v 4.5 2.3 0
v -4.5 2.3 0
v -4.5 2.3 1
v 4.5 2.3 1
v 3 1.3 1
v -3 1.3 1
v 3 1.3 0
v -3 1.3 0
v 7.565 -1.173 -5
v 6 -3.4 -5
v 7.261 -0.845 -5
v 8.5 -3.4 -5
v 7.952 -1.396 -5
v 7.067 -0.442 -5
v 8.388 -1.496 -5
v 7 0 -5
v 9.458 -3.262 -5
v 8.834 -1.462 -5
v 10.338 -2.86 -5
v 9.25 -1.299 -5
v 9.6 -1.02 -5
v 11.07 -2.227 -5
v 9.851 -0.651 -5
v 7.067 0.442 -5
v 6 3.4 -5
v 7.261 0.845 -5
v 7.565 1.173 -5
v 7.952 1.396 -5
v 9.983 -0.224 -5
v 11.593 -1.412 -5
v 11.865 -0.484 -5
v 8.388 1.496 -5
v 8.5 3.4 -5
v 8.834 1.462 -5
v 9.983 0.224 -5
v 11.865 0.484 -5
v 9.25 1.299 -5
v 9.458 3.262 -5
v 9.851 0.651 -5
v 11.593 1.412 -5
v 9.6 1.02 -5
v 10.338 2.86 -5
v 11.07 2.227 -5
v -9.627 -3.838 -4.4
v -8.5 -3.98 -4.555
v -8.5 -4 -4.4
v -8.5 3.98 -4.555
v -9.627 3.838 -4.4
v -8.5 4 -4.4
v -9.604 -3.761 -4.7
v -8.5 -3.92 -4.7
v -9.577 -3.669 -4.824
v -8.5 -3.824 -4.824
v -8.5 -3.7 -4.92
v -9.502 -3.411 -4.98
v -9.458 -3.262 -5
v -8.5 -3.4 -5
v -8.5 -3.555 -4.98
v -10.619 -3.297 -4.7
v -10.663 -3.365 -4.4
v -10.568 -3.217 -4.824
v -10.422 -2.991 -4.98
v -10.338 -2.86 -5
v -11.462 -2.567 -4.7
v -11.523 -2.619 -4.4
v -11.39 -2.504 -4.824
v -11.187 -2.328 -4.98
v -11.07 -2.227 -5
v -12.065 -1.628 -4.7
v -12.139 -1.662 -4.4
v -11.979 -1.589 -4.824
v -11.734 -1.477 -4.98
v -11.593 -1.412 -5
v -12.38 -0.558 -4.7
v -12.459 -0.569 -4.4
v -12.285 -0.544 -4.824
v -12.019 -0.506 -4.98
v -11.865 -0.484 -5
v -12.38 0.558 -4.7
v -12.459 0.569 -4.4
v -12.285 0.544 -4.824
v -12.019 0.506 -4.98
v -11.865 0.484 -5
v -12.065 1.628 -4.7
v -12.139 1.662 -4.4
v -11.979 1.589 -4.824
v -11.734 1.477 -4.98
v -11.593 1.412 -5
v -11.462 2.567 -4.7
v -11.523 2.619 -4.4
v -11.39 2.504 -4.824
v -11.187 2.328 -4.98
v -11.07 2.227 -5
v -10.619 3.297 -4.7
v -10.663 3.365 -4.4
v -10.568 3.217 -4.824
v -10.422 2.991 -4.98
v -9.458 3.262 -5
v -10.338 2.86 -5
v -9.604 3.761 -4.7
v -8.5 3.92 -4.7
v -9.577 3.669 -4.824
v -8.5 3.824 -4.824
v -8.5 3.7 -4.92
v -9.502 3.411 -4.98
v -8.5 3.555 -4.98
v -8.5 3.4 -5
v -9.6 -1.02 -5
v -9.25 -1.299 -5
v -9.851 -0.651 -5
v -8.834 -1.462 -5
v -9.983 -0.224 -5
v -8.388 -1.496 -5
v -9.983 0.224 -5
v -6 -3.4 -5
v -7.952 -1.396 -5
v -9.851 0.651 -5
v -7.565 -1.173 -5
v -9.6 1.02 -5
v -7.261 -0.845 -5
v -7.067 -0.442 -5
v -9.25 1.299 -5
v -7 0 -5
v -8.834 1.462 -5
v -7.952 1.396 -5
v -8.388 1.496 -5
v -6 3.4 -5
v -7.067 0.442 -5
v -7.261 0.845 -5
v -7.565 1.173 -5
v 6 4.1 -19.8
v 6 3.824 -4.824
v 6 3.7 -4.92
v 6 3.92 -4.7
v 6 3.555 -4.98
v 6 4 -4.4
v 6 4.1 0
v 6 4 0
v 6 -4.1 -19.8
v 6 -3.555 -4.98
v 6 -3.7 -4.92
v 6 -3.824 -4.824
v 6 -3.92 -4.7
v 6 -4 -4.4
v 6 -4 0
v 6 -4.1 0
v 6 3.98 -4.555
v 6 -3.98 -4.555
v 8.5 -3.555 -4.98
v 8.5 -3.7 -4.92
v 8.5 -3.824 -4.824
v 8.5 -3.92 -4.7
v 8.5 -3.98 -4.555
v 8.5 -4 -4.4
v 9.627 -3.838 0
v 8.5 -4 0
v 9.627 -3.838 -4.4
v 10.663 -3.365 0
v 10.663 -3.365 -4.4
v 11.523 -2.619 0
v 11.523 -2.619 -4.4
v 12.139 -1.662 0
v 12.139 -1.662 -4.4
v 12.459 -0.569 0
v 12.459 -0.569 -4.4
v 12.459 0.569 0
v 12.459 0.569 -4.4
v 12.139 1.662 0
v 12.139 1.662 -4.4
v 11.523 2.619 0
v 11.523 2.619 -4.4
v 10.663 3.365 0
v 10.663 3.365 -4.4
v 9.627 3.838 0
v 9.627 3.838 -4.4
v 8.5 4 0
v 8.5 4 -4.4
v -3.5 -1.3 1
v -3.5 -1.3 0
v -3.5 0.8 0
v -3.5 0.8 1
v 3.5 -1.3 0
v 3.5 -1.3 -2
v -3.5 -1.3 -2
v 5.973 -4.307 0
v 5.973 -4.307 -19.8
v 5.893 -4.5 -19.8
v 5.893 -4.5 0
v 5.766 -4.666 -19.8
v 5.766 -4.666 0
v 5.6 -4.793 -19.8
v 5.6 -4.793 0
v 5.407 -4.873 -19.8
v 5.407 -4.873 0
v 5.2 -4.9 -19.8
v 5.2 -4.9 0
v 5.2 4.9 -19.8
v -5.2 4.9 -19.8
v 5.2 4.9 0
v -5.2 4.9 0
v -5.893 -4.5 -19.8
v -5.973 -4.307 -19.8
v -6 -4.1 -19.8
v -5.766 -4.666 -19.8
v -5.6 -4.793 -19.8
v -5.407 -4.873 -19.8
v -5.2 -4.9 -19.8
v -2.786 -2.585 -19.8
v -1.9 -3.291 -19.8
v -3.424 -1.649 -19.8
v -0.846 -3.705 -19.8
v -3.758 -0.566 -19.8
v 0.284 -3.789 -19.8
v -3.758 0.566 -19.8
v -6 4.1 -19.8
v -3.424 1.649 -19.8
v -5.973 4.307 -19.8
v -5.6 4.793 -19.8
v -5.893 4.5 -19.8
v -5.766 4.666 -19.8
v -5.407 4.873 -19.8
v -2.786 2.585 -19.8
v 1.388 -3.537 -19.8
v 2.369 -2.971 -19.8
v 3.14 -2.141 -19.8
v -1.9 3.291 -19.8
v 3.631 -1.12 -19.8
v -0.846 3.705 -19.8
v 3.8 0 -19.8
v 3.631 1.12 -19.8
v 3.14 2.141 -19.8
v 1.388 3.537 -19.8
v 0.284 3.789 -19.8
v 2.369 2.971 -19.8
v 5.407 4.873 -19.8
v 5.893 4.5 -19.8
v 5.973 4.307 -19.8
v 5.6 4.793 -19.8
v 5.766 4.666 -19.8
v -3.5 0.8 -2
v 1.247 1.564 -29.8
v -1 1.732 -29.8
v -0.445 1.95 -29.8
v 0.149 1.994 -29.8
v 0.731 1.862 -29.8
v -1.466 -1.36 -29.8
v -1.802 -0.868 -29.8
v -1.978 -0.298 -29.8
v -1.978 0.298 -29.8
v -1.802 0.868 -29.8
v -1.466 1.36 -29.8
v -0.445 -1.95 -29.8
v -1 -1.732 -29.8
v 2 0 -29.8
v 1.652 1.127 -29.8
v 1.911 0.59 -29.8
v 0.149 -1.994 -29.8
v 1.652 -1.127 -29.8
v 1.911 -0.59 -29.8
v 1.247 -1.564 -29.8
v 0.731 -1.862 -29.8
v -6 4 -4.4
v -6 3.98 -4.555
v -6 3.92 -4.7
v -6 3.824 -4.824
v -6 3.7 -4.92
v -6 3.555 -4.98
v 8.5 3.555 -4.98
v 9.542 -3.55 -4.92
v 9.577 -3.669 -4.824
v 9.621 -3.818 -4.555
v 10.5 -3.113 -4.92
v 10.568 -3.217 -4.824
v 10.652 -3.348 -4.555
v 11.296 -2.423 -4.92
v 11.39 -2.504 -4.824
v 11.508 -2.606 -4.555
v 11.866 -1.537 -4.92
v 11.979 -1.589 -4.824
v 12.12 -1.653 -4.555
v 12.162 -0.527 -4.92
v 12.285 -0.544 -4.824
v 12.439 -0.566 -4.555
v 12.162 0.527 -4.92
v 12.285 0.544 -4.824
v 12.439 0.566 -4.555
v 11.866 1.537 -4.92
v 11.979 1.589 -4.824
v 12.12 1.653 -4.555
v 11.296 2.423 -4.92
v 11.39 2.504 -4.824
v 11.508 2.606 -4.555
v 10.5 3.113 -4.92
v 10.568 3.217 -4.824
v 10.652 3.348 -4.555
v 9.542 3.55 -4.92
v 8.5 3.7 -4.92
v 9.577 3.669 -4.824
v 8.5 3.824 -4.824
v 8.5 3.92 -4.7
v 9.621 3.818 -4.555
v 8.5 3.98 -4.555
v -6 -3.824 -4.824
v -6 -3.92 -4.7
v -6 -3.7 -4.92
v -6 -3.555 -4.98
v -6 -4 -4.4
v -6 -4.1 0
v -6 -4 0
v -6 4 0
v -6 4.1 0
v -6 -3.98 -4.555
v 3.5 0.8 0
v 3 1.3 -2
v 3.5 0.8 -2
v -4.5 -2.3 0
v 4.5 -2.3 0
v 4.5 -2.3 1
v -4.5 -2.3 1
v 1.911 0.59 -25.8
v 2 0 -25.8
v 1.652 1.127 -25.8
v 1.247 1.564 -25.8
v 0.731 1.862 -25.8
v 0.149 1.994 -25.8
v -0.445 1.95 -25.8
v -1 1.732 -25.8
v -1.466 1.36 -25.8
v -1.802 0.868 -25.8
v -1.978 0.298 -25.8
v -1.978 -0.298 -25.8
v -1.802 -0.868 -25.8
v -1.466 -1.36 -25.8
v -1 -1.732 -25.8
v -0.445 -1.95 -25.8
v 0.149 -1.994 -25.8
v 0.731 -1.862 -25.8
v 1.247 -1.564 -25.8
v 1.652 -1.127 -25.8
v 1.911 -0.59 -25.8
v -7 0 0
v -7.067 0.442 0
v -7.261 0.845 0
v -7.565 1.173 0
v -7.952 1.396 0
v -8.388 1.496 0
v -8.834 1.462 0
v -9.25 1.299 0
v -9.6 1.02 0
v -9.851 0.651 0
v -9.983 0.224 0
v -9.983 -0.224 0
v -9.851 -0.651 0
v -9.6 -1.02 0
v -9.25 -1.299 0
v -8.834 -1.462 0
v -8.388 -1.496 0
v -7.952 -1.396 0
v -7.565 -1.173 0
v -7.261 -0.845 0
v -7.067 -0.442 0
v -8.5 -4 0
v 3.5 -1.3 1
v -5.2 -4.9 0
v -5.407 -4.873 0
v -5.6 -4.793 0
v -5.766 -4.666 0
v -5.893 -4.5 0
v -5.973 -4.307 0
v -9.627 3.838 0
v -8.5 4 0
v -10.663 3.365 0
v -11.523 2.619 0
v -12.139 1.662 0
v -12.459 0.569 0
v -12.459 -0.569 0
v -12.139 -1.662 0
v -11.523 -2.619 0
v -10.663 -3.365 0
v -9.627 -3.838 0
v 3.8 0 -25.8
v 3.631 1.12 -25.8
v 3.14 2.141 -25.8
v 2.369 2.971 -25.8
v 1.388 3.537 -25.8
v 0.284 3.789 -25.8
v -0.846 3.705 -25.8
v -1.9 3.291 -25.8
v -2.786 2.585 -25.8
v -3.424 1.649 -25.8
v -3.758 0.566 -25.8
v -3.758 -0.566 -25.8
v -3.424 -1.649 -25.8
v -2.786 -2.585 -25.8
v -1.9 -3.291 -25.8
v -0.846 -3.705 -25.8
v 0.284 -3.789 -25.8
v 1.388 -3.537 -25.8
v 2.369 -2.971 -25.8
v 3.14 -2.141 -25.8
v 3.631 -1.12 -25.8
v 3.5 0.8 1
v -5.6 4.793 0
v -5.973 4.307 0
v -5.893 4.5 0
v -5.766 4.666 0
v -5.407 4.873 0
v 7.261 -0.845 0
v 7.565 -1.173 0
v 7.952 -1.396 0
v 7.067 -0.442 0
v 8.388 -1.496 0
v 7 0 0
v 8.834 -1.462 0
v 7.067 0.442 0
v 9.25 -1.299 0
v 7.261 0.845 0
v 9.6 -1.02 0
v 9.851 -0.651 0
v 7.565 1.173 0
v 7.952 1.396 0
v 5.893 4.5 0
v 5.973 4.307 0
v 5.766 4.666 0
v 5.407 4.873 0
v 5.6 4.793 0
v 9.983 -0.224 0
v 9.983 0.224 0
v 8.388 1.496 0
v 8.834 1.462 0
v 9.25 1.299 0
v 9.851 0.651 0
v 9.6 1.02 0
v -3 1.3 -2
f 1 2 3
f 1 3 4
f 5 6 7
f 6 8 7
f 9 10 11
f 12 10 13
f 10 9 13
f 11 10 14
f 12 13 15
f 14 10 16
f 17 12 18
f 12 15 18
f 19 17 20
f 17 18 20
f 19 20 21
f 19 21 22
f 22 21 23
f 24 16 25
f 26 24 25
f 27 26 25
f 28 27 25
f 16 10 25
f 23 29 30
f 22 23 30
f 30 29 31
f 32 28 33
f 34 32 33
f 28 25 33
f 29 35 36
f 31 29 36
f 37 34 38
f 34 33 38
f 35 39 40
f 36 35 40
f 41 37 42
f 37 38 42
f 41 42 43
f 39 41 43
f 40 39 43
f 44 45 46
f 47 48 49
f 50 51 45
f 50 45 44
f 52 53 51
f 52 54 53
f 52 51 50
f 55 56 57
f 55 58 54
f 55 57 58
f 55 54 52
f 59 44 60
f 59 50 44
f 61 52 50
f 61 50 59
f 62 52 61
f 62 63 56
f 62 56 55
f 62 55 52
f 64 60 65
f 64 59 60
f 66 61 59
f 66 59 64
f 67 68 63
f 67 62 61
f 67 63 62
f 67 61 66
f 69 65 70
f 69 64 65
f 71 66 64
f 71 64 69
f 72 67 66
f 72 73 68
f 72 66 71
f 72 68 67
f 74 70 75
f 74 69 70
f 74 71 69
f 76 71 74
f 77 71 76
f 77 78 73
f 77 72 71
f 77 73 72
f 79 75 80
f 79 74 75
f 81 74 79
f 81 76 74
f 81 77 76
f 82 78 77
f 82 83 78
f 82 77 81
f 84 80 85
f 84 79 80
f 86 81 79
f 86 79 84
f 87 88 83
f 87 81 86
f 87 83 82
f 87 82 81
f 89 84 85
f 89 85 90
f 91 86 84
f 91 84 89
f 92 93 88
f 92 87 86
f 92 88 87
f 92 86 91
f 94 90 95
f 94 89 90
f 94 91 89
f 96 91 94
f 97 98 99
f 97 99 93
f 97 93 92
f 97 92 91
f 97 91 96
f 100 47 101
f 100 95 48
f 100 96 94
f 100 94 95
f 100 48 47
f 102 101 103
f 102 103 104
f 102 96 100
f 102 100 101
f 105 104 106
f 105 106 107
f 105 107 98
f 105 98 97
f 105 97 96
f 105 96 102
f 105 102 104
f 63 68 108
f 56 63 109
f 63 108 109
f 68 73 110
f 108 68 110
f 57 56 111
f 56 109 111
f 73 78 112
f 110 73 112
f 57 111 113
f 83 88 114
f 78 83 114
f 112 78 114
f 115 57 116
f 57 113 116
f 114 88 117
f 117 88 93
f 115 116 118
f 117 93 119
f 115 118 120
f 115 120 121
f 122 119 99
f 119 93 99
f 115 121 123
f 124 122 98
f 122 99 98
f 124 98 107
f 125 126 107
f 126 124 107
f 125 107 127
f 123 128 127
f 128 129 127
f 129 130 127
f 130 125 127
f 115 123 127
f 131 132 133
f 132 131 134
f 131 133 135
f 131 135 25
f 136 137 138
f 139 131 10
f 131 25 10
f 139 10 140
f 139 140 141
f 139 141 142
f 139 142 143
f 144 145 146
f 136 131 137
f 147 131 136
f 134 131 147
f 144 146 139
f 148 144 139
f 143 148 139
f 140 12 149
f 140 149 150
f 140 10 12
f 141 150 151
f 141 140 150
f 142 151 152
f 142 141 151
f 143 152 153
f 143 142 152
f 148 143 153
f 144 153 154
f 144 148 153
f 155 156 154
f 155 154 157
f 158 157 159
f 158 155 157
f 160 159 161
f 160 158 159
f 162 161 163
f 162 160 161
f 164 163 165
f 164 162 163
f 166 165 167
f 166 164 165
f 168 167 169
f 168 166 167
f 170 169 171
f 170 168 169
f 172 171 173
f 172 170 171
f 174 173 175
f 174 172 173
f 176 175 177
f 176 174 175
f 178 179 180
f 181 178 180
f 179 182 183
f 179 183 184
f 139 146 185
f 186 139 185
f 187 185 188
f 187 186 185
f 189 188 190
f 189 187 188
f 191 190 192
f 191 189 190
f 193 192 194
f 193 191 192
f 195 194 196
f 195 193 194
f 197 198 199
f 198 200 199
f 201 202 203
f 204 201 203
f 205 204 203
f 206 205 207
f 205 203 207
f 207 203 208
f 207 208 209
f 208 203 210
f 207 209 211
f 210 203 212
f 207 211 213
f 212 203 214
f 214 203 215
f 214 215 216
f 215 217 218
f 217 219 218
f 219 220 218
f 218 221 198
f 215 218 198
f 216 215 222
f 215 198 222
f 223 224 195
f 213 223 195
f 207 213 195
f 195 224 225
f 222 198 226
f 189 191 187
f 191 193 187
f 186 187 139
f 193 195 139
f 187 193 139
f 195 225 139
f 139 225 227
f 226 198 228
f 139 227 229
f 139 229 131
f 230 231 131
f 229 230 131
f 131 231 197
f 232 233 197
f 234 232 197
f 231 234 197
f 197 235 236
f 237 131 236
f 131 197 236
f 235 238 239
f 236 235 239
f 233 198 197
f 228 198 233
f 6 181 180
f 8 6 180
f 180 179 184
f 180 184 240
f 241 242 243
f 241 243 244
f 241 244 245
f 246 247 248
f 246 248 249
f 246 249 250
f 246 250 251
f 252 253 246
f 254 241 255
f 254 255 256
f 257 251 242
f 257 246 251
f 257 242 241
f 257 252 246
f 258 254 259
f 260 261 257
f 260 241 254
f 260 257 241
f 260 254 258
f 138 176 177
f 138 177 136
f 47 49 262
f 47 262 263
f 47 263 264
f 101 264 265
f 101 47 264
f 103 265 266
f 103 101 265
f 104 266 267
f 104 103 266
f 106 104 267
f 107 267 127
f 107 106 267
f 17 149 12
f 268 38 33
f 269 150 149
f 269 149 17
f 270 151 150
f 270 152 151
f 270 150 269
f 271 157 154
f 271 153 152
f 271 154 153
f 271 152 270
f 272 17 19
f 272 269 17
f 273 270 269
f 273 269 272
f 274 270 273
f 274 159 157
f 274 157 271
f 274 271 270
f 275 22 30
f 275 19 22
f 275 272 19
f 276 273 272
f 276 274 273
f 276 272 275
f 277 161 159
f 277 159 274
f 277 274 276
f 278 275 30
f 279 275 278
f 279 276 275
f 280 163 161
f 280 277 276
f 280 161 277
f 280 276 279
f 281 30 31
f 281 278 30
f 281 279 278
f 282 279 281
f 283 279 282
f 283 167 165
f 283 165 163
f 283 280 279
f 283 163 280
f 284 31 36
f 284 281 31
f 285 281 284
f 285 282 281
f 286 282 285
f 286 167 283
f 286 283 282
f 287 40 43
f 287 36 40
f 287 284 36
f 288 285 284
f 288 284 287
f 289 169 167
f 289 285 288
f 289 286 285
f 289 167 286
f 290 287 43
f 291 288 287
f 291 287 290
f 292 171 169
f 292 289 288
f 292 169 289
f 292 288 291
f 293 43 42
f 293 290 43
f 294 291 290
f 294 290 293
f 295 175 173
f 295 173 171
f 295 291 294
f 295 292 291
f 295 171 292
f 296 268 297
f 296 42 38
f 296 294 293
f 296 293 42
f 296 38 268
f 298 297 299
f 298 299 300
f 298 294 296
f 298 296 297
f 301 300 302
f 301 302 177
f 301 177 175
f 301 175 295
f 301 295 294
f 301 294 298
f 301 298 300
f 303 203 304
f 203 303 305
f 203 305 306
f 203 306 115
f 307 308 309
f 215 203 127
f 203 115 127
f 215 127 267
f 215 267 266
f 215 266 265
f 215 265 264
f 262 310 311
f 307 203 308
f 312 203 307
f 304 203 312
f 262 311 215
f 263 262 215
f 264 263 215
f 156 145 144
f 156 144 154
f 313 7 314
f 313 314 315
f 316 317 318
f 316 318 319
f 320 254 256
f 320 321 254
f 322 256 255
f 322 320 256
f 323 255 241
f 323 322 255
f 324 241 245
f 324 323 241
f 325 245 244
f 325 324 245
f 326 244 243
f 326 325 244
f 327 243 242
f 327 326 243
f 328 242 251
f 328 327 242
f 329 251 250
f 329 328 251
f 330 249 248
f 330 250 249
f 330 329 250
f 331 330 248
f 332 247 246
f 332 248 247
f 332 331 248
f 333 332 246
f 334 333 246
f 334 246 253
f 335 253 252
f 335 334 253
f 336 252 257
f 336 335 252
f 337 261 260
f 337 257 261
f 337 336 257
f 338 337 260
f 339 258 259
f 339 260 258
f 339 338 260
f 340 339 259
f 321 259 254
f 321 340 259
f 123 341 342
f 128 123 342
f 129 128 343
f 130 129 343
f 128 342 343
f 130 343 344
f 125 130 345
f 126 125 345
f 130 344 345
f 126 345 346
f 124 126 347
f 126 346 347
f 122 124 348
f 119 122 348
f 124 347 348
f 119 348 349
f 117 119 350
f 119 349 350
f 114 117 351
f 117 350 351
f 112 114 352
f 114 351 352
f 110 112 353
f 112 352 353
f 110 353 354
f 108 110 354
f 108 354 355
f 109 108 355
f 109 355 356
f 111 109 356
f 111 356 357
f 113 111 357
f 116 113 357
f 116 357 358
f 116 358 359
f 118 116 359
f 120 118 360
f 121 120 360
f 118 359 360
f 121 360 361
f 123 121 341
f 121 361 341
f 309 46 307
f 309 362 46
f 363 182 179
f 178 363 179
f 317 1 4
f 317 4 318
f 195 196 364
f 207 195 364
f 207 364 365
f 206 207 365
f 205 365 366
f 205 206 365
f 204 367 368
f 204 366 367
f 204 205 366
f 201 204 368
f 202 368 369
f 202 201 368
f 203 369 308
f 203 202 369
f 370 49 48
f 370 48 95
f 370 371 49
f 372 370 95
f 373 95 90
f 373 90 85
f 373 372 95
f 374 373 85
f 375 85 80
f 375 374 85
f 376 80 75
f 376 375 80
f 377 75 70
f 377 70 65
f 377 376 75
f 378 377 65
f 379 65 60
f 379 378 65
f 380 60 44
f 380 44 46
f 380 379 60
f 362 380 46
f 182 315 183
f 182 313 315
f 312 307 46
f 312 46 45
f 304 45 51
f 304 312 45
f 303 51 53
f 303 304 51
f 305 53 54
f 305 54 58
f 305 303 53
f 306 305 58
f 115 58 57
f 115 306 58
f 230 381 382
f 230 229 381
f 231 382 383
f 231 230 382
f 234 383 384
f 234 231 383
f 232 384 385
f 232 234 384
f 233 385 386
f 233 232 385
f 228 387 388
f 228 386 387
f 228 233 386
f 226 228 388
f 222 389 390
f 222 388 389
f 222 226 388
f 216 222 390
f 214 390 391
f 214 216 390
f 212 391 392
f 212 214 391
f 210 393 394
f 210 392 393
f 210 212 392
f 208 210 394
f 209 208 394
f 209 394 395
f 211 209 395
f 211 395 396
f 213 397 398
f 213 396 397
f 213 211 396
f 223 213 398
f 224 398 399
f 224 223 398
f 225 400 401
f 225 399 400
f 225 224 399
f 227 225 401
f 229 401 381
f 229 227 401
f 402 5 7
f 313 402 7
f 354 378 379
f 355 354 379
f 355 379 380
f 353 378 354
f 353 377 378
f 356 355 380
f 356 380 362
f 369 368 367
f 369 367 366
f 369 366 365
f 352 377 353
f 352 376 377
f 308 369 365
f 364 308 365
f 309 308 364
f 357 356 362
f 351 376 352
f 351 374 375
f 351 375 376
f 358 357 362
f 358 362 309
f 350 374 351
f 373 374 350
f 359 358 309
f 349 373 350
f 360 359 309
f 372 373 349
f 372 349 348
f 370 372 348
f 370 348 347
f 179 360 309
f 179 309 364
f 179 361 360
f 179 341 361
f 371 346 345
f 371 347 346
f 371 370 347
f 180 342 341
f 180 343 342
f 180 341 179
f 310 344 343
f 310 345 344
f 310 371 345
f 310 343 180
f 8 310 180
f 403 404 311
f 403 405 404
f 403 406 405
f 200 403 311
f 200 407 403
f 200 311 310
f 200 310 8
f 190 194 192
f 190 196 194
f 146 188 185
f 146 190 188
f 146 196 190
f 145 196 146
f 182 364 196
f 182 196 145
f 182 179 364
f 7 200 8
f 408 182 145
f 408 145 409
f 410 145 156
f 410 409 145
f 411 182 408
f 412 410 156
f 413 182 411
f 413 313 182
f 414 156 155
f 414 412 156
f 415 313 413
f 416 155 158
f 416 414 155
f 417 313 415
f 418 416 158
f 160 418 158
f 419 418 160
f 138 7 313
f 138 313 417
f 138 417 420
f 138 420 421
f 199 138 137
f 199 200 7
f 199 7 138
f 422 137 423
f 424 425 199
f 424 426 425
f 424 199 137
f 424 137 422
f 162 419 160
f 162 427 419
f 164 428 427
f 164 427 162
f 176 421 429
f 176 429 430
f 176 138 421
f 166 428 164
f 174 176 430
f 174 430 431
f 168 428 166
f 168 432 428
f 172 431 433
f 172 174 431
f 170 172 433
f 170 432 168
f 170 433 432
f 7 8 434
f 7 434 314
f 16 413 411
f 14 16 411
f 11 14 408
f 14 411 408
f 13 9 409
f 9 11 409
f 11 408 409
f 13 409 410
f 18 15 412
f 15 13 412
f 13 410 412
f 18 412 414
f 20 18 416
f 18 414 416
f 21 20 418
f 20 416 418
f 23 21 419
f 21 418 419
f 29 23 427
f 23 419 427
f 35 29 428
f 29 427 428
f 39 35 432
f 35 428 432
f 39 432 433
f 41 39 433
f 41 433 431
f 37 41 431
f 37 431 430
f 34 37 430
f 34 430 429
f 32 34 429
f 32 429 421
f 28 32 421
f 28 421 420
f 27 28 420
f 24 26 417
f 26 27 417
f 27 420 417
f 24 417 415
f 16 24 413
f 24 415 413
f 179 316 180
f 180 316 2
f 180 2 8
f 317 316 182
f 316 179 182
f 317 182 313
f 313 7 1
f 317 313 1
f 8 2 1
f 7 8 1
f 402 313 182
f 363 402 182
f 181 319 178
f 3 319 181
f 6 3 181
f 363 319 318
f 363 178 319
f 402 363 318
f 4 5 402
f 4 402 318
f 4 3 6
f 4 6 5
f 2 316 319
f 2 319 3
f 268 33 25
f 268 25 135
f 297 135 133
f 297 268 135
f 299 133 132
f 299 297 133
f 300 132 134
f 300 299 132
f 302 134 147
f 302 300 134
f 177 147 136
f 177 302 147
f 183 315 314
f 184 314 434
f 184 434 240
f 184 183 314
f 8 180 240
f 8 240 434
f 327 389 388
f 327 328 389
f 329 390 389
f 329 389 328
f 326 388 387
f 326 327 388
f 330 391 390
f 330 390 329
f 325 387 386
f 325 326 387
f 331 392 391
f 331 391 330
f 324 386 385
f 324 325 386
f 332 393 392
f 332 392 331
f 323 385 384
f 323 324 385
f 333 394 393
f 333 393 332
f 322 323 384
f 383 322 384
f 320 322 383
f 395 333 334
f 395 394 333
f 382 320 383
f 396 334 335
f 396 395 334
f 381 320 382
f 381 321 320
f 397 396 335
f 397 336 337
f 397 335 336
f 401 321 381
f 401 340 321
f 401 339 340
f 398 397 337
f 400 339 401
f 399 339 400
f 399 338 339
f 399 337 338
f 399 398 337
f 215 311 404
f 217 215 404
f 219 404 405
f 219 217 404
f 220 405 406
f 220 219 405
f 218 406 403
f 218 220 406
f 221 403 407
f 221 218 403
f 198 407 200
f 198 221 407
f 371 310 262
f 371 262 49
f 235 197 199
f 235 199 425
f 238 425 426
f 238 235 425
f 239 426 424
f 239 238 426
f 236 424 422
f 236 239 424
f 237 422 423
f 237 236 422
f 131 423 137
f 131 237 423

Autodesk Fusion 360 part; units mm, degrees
sketch "Sketch1" plane through (0, 0, 0) normal (0, 0, 1) x (1, 0, 0)
  line L0 (4.5, -2.3) -> (-4.5, -2.3)
  line L1 (-4.5, -2.3) -> (-4.5, 2.3)
  line L2 (-4.5, 2.3) -> (4.5, 2.3)
  line L3 (4.5, 2.3) -> (4.5, -2.3)
  line L4 (4.5, -2.3) -> (-4.5, 2.3) construction
  line L5 (-4.5, -2.3) -> (4.5, 2.3) construction
  line L6 (3.5, -1.3) -> (-3.5, -1.3)
  line L7 (-3.5, -1.3) -> (-3.5, 1.3)
  line L8 (-3.5, 1.3) -> (3.5, 1.3)
  line L9 (3.5, 1.3) -> (3.5, -1.3)
  line L10 (6, -4.9) -> (-6, -4.9)
  line L11 (-6, -4.9) -> (-6, 4.9)
  line L12 (-6, 4.9) -> (6, 4.9)
  line L13 (6, 4.9) -> (6, -4.9)
  line L14 (6, -4.9) -> (-6, 4.9) construction
  line L15 (-6, -4.9) -> (6, 4.9) construction
  circle A0 centre (-8.5, 0) radius 1.5
  line L16 (-8.5, -4) -> (0, -4)
  arc A1 (0, -4) -> (0, 4) centre (0, 0) ccw
  line L17 (0, 4) -> (-8.5, 4)
  arc A2 (-8.5, 4) -> (-8.5, -4) centre (-8.5, 0) ccw
  line L18 (-8.5, 0) -> (0, 0) construction
  dimension "d1" = 9
  dimension "d2" = 4.6
  dimension "d3" = 1
  dimension "d4" = 12
  dimension "d5" = 9.8
  dimension "d6" = 3
  dimension "d7" = 8.5
  dimension "d8" = 8
extrude "Extrude1" add sketch "Sketch1" against normal blind 19.8 contours L0 L2 L3 L10 L11 L12 L13 L16 A1 L17 | L0 L2 L3 A1 | L0 L1 L2 L11 L16 A1 L17 | L0 L1 L2 A1 | L6 L7 L8 L9 makes body 1
extrude "Extrude2" add sketch "Sketch1" along normal blind 1 separate body contours L0 L2 L3 A1 | L0 L1 L2 A1 makes body 2
fillet "Fillet1" radius 0.8 4 edges at (6, -4.9, -9.9) (-6, -4.9, -9.9) (-6, 4.9, -9.9) (6, 4.9, -9.9) on bodies 1
extrude "Extrude3" add sketch "Sketch1" against normal blind 5 contours L11 L16 L17 A2 bodies 1
mirror "Mirror1" about plane through (0, 0, 0) normal (1, 0, 0) of "Extrude3"
chamfer "Chamfer2" distance 0.5 angle 45 2 edges at (3.5, 1.3, 0.5) (-3.5, 1.3, 0.5) on bodies 2
fillet "Fillet2" radius 0.6 6 edges at (7.25, -4, -5) (12.5, 0, -5) (7.25, 4, -5) (-7.25, -4, -5) (-12.5, 0, -5) (-7.25, 4, -5) on bodies 1
sketch "Sketch2" plane through (0, 0, -19.8) normal (0, 0, -1) x (1, 0, 0)
  arc A0 (5.2, -4.9) -> (6, -4.1) centre (5.2, -4.1) ccw
  line L0 (6, -4.1) -> (6, 4.1)
  arc A1 (6, 4.1) -> (5.2, 4.9) centre (5.2, 4.1) ccw
  line L1 (5.2, 4.9) -> (-5.2, 4.9)
  arc A2 (-5.2, 4.9) -> (-6, 4.1) centre (-5.2, 4.1) ccw
  line L2 (-6, 4.1) -> (-6, -4.1)
  arc A3 (-6, -4.1) -> (-5.2, -4.9) centre (-5.2, -4.1) ccw
  line L3 (-5.2, -4.9) -> (5.2, -4.9)
  circle A4 centre (0, 0) radius 3.8
  circle A5 centre (0, 0) radius 2
  dimension "d20" = 7.6
  dimension "d21" = 4
extrude "Extrude4" add sketch "Sketch2" along normal blind 6 contours A4 | A5 bodies 1
extrude "Extrude5" add sketch "Sketch2" along normal blind 4 from surface at 6 contours A5 bodies 1
sketch "Sketch3" plane through (0, 0, 0) normal (0, 0, 1) x (-1, 0, 0)
  circle A0 centre (-8.5, 0) radius 1.5
  circle A1 centre (8.5, 0) radius 1.5
  arc A2 (-6, -4.1) -> (-5.2, -4.9) centre (-5.2, -4.1) ccw
  line L0 (-5.2, -4.9) -> (5.2, -4.9)
  arc A3 (5.2, -4.9) -> (6, -4.1) centre (5.2, -4.1) ccw
  line L1 (6, -4.1) -> (6, -4)
  line L2 (6, -4) -> (8.5, -4)
  arc A4 (8.5, -4) -> (8.5, 4) centre (8.5, 0) ccw
  line L3 (8.5, 4) -> (6, 4)
  line L4 (6, 4) -> (6, 4.1)
  arc A5 (6, 4.1) -> (5.2, 4.9) centre (5.2, 4.1) ccw
  line L5 (5.2, 4.9) -> (-5.2, 4.9)
  arc A6 (-5.2, 4.9) -> (-6, 4.1) centre (-5.2, 4.1) ccw
  line L6 (-6, 4.1) -> (-6, 4)
  line L7 (-6, 4) -> (-8.5, 4)
  arc A7 (-8.5, 4) -> (-8.5, -4) centre (-8.5, 0) ccw
  line L8 (-8.5, -4) -> (-6, -4)
  line L9 (-6, -4) -> (-6, -4.1)
  line L10 (3, -1.3) -> (-3, -1.3)
  line L11 (-3, -1.3) -> (-3.5, -0.8)
  line L12 (-3.5, -0.8) -> (-3.5, 1.3)
  line L13 (-3.5, 1.3) -> (3.5, 1.3)
  line L14 (3.5, 1.3) -> (3.5, -0.8)
  line L15 (3.5, -0.8) -> (3, -1.3)
  line L16 (-4.5, -2.3) -> (4.5, -2.3)
  line L17 (4.5, -2.3) -> (4.5, 2.3)
  line L18 (4.5, 2.3) -> (-4.5, 2.3)
  line L19 (-4.5, 2.3) -> (-4.5, -2.3)
extrude "Extrude6" cut sketch "Sketch3" against normal blind 2 contours L10 L11 L12 L13 L14 L15 bodies 1
equation "d7 = ( 17 / 2 ) * 1 mm"
